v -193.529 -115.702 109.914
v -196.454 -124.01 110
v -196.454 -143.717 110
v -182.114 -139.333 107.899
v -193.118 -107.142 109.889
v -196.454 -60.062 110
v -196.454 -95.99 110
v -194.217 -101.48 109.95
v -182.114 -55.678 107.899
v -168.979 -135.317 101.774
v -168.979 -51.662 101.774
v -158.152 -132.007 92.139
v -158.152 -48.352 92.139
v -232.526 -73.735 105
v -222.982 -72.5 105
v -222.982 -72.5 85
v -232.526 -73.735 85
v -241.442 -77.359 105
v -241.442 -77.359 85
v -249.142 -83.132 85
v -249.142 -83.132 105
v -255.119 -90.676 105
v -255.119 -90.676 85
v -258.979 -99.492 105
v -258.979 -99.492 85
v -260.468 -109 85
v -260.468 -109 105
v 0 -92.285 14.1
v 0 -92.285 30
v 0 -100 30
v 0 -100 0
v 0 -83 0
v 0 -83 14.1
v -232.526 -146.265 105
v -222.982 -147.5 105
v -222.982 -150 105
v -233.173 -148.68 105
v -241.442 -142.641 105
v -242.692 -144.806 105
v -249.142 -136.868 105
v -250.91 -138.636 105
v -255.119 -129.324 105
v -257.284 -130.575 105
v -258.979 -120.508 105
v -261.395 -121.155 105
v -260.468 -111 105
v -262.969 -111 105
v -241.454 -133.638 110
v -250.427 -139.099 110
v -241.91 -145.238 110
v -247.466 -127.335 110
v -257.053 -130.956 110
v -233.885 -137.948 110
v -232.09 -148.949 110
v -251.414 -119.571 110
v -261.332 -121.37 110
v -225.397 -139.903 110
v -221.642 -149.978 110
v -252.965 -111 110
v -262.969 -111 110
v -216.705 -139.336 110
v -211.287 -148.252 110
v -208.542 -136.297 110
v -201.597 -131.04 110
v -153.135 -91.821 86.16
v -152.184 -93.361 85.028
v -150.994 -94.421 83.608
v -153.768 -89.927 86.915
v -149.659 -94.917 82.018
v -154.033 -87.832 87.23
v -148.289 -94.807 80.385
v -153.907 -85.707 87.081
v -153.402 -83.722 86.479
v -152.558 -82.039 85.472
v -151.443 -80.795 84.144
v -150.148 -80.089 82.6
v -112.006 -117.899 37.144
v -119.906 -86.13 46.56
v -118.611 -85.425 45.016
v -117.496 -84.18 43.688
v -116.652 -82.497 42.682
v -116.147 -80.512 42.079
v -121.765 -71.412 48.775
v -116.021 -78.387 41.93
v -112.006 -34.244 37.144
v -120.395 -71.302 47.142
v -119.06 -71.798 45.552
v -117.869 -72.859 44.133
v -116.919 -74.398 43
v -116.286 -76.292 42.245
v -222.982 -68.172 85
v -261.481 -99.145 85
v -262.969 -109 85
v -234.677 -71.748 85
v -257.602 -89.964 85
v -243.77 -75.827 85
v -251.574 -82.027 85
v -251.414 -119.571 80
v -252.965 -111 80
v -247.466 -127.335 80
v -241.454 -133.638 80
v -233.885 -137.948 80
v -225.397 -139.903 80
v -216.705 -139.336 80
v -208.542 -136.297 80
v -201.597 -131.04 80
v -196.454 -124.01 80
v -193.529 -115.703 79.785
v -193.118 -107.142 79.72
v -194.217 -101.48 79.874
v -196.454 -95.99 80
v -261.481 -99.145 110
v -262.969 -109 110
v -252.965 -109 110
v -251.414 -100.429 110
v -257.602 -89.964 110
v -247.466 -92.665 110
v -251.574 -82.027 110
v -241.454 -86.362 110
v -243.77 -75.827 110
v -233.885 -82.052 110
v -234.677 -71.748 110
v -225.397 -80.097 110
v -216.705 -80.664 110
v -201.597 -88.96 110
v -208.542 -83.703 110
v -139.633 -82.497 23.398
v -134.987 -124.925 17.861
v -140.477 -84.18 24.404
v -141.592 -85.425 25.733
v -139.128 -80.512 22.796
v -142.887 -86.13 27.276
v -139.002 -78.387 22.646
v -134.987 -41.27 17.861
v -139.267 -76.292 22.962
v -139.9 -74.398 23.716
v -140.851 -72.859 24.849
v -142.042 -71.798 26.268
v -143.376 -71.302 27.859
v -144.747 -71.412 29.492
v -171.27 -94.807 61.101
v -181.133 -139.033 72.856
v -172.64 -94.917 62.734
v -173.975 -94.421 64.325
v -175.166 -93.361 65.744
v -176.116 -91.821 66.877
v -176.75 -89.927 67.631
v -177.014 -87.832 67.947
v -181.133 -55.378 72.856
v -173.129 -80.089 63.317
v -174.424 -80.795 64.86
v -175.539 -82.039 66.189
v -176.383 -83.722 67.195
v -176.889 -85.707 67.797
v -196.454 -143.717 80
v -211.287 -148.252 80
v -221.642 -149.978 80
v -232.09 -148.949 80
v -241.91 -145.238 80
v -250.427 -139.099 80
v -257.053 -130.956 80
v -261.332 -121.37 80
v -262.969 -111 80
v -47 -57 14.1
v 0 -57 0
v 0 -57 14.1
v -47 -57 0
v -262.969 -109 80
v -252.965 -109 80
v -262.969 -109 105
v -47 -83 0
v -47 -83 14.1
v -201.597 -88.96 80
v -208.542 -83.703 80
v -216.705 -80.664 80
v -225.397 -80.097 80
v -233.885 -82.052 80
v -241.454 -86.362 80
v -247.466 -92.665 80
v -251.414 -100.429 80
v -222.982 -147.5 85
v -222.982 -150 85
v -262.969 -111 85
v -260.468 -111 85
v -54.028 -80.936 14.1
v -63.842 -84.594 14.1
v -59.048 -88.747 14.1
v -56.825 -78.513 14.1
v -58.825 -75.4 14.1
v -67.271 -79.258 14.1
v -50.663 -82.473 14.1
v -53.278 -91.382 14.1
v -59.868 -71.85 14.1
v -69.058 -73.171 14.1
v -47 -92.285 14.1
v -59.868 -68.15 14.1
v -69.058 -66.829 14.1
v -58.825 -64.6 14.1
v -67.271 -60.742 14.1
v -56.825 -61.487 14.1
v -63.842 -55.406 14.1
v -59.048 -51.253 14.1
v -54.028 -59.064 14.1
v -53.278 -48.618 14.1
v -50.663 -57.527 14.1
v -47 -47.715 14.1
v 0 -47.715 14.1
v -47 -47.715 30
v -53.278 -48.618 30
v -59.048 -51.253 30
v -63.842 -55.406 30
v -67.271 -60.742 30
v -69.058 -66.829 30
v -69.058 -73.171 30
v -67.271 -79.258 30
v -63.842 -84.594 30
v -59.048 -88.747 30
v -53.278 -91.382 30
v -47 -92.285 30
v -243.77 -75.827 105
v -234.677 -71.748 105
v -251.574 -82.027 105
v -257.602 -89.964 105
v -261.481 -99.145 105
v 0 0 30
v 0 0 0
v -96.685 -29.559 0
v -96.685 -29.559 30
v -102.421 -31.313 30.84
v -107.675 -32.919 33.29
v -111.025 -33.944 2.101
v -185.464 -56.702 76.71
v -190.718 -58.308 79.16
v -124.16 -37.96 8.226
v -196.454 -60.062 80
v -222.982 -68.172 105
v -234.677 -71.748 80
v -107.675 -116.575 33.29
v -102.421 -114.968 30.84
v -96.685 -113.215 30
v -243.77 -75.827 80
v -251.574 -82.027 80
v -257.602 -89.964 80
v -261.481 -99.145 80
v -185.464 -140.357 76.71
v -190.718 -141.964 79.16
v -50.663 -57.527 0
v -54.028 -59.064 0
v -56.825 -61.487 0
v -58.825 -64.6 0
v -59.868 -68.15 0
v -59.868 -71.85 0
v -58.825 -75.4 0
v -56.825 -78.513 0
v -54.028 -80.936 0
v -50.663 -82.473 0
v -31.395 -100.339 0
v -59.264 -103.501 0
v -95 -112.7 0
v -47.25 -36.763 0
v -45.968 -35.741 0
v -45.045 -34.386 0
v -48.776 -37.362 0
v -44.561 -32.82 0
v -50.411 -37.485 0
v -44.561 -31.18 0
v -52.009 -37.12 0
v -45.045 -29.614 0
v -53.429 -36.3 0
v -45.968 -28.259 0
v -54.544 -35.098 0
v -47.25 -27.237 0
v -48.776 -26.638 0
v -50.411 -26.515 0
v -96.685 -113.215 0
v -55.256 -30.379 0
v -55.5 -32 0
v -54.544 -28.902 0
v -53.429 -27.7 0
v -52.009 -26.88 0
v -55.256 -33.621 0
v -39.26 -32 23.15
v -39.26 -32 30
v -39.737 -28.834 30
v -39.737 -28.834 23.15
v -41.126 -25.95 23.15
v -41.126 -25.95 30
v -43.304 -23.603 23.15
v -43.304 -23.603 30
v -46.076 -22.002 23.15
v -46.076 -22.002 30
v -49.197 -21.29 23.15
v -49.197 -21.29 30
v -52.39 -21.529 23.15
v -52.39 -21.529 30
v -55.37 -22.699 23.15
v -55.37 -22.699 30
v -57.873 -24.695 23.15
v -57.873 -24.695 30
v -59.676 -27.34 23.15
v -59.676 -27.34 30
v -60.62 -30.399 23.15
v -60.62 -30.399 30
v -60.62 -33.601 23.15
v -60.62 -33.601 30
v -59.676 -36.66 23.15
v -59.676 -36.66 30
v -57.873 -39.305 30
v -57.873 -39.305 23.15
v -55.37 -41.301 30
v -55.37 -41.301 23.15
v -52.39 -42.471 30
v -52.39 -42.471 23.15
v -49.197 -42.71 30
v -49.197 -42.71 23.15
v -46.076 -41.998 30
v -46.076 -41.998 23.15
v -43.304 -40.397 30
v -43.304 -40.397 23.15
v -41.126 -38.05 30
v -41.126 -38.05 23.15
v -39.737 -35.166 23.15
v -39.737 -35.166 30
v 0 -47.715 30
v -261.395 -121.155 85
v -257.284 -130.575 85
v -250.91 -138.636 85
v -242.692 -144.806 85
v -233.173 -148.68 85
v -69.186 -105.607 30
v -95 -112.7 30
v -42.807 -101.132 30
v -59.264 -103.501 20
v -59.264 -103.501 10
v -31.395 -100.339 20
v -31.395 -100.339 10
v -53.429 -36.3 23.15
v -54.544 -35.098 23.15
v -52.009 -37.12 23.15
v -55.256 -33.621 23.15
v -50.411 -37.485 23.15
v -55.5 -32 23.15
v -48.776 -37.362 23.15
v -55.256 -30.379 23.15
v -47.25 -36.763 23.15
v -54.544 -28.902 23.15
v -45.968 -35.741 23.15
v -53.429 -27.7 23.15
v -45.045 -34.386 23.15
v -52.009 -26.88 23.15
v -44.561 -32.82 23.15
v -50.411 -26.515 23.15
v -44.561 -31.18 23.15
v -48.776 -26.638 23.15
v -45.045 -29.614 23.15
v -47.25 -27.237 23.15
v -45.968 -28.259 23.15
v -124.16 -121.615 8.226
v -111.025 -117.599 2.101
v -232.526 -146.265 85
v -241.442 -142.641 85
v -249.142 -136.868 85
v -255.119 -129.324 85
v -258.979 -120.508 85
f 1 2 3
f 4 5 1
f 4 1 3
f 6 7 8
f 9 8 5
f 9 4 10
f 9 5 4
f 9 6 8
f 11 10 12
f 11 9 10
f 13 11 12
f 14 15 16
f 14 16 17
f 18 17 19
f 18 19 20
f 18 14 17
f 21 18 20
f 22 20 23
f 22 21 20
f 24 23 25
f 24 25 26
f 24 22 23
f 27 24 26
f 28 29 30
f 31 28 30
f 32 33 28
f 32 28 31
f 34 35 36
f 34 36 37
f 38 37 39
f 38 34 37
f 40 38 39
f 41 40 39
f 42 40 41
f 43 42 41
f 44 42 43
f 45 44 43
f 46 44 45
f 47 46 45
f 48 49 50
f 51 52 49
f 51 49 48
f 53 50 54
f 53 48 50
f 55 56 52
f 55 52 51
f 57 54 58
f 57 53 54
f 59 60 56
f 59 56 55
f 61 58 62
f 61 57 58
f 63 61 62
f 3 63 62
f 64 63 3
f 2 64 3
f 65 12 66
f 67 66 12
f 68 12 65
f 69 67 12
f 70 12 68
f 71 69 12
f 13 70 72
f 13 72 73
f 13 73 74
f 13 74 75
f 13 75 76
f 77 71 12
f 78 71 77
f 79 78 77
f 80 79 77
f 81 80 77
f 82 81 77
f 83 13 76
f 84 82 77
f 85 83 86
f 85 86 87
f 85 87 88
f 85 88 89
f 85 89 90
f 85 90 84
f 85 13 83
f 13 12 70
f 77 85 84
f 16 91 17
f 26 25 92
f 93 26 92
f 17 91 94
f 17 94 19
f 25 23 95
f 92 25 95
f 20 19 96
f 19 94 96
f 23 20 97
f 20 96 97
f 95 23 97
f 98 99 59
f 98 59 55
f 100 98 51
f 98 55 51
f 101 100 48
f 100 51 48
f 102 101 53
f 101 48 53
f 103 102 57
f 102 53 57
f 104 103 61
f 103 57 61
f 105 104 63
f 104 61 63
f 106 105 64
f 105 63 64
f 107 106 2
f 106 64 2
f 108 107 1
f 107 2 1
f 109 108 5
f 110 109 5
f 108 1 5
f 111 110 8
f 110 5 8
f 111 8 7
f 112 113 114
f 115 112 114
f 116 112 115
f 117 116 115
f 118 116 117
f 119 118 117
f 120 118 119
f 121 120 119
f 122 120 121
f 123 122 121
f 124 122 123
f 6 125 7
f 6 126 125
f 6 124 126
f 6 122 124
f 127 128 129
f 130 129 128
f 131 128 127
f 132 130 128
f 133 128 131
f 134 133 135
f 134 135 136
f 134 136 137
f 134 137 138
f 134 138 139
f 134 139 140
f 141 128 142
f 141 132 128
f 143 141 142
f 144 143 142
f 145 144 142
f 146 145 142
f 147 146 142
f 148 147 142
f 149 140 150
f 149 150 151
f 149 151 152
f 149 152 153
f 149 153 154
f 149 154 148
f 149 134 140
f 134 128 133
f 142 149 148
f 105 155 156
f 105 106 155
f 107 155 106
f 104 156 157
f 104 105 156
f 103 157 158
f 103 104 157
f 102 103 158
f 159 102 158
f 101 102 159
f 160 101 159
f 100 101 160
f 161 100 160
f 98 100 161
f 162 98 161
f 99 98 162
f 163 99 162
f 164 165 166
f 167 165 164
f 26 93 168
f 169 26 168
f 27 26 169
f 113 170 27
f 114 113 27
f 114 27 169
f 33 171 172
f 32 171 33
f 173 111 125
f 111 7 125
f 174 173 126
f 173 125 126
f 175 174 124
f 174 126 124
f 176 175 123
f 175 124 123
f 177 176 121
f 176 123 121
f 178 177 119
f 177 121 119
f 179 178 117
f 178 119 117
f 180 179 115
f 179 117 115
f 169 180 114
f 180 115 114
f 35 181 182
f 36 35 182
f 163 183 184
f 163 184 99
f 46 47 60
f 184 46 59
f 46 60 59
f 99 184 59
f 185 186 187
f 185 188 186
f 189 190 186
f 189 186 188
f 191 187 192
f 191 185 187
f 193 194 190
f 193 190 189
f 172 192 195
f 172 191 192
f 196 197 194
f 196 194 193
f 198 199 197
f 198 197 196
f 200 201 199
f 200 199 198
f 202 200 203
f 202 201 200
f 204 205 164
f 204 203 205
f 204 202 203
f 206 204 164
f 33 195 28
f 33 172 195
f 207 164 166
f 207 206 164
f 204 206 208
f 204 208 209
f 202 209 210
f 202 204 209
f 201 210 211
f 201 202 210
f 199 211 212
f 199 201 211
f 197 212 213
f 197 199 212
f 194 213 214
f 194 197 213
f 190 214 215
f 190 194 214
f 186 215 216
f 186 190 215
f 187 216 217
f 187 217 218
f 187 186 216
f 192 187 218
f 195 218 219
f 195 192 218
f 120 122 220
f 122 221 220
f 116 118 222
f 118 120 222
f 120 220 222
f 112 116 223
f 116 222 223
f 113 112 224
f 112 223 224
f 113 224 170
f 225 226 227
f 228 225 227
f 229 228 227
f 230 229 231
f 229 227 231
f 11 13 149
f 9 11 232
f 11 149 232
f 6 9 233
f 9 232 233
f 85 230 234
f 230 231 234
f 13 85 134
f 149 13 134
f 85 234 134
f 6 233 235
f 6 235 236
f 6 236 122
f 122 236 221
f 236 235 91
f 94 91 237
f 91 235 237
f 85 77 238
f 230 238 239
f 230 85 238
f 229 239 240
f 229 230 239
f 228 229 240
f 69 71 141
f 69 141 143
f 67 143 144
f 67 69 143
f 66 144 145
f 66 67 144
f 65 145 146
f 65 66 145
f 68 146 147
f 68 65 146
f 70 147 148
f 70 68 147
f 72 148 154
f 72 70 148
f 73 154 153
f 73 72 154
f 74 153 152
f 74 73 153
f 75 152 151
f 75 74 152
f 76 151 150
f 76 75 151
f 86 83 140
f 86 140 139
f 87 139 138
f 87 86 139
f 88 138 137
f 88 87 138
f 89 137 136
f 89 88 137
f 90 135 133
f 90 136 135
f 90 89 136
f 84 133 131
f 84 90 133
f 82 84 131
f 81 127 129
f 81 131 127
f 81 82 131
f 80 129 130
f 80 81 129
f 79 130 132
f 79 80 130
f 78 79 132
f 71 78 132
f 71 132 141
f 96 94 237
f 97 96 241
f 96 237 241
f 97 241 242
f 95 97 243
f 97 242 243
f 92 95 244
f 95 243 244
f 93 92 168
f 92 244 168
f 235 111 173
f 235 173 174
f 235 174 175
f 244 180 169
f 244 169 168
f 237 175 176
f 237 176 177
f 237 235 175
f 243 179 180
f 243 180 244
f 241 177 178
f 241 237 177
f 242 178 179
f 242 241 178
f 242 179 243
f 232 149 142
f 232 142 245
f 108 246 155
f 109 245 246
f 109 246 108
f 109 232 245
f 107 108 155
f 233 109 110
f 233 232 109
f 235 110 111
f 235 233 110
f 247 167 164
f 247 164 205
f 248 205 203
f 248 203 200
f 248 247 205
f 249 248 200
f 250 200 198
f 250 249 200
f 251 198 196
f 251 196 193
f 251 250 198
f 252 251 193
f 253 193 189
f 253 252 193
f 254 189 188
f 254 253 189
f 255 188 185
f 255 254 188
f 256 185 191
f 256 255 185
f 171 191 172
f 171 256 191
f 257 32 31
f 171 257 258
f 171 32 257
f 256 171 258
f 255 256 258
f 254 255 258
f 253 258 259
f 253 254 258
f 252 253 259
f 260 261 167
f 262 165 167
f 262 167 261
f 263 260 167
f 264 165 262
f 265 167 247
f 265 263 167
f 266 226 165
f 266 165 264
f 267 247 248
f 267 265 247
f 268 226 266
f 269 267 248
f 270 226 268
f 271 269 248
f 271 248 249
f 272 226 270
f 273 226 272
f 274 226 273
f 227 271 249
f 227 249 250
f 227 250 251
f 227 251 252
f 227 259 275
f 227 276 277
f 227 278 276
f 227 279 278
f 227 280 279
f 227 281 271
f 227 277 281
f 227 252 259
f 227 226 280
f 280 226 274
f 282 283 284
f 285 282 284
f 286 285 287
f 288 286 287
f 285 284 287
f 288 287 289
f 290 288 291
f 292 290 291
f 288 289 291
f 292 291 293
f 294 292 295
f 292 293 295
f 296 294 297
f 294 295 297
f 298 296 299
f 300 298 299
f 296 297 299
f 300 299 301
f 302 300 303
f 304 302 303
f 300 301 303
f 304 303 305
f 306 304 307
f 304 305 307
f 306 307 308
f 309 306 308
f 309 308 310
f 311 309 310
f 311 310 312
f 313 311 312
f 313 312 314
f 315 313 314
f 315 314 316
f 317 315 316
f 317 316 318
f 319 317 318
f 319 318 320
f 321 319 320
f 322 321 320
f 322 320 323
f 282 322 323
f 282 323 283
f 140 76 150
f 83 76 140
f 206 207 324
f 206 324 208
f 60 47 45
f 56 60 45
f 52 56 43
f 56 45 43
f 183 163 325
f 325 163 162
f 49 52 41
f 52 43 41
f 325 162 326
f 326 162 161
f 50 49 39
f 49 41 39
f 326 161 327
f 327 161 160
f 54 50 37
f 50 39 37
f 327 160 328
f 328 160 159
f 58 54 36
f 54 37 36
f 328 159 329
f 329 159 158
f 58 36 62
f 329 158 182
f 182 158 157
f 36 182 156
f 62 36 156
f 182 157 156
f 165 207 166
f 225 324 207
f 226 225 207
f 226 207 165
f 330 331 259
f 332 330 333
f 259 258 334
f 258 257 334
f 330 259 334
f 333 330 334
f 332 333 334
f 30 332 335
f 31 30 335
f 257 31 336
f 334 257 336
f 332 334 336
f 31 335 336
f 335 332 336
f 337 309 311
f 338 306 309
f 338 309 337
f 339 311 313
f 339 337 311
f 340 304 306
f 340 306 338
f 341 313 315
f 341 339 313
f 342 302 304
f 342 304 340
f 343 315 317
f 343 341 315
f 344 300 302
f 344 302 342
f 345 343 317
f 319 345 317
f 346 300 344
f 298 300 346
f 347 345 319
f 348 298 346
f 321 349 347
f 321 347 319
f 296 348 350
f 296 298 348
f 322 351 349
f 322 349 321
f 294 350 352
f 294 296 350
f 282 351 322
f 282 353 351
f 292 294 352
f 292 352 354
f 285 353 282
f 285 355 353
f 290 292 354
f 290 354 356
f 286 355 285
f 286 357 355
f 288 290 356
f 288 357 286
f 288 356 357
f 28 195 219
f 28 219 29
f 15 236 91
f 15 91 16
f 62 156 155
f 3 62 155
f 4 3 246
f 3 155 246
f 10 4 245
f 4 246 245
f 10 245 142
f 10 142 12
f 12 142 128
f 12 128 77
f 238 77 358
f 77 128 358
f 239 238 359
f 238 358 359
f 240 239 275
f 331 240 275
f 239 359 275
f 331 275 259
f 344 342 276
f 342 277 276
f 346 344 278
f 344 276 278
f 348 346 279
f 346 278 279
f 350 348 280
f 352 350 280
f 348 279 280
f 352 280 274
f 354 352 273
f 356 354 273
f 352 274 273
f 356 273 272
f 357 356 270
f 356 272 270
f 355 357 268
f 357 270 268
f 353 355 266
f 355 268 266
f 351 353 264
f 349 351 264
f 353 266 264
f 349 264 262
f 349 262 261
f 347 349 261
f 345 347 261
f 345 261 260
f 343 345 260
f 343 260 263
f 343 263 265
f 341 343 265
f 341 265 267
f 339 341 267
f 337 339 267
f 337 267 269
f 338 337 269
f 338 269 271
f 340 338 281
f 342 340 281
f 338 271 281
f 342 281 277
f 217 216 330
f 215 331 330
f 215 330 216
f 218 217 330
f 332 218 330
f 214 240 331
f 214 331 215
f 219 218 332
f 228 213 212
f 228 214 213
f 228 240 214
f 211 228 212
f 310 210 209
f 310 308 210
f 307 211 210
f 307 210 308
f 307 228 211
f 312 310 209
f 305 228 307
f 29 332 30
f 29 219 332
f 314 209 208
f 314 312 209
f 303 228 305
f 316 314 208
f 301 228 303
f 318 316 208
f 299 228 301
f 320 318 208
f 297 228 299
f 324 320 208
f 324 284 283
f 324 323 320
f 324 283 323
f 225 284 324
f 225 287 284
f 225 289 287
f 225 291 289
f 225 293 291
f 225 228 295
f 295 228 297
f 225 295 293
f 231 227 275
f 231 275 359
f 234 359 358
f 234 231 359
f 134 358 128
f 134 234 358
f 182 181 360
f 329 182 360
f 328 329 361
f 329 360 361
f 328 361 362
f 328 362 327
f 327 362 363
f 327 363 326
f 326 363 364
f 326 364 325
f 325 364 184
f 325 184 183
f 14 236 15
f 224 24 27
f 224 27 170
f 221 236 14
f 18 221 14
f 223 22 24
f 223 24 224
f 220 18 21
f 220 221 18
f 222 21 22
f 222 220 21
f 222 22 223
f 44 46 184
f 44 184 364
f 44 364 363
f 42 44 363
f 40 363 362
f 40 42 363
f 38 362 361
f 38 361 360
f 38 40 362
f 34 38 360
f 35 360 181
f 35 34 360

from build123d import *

# Parameters (mm, degrees)
EXTRUDE_THIN1_DEPTH                       = 150
SKETCH2_OUTSIDE_W                         = 349.23
SKETCH2_OUTSIDE_H                         = 219.23
CUT_EXTRUDE1_DEPTH                        = 337.154726279
SKETCH3_R                                 = 30
CUT_EXTRUDE2_DEPTH                        = 323.116973634
CUT_EXTRUDE3_START                        = -15
CUT_EXTRUDE3_DEPTH                        = 10
SKETCH5_W                                 = 100
SKETCH5_H                                 = 2
CUT_EXTRUDE4_DEPTH                        = 323.116973634
CBORE_START                               = 14.1
CBORE_SLOT_FOR_M24_HEX_HEAD_BOLT1_DEPTH   = 15.9
CBORE_SLOT_FOR_M24_HEX_HEAD_BOLT1_2_DEPTH = 14.1
CBORE_FOR_M10_HEX_HEAD_BOLT1_D            = 11
CBORE_FOR_M10_HEX_HEAD_BOLT1_CBORE_D      = 21.48
CBORE_FOR_M10_HEX_HEAD_BOLT1_CBORE_DEPTH  = 6.85
CUT_EXTRUDE5_DEPTH                        = 303.31664336


# Read off the part's stored shape, not the designer's step: CBORE SLOT for M24 Hex Head Bolt1
with BuildPart() as part:
    # Sketch1 → Extrude-Thin1 (new body)
    with BuildSketch(Plane(origin=(0, 0, 0), x_dir=(1, 0, 0), z_dir=(0, 1, 0))):
        with BuildLine():
            Line((0, 0), (-96.684617092, 0))
            ThreePointArc((-96.684617092, 0), (-117.815530179, -4.684610648), (-134.986839248, -17.860619516))
            Line((-134.986839248, -17.860619516), (-181.133234795, -72.855752194))
            ThreePointArc((-181.133234795, -72.855752194), (-188.001758422, -78.126155741), (-196.454123657, -80))
            Line((-196.454123657, -80), (-280, -80))
            Line((-280, -80), (-280, -110))
            Line((-280, -110), (-196.454123657, -110))
            ThreePointArc((-196.454123657, -110), (-175.32321057, -105.315389352), (-158.151901501, -92.139380484))
            Line((-158.151901501, -92.139380484), (-112.005505955, -37.144247806))
            ThreePointArc((-112.005505955, -37.144247806), (-105.136982327, -31.873844259), (-96.684617092, -30))
            Line((-96.684617092, -30), (0, -30))
            Line((0, -30), (0, 0))
        make_face()
    extrude(amount=-EXTRUDE_THIN1_DEPTH)

    # Sketch2 outside → Cut-Extrude1 (cut, through all)
    with BuildSketch(Plane.XY):
        with Locations((-140, -75)):
            Rectangle(SKETCH2_OUTSIDE_W, SKETCH2_OUTSIDE_H)
        with BuildLine():
            Line((0, 0), (-234.676511429, -71.747809761))
            ThreePointArc((-234.676511429, -71.747809761), (-261.233833478, -121.694868189), (-211.286775051, -148.252190239))
            Line((-211.286775051, -148.252190239), (-95, -112.699755258))
            add(Edge.make_bspline(
                [(-95, -112.699755258), (-51.532544729, -99.410420536), (-36.95554526, -100), (0, -100)],
                knots=[0, 0, 0, 0, 1, 1, 1, 1], degree=3))
            Line((0, -100), (0, 0))
        make_face(mode=Mode.SUBTRACT)
    extrude(amount=CUT_EXTRUDE1_DEPTH, mode=Mode.SUBTRACT)

    # Sketch3 → Cut-Extrude2 (cut, through all)
    with BuildSketch(Plane.XY.offset(110)):
        with Locations(Location((-222.98164324, -110, 0), (0, 0, 27.840553026))):
            Circle(SKETCH3_R)
    extrude(amount=-CUT_EXTRUDE2_DEPTH, mode=Mode.SUBTRACT)

    # Sketch4 → Cut-Extrude3 (cut, symmetric)
    with BuildSketch(Plane.XY.offset(110).offset(CUT_EXTRUDE3_START)):
        with BuildLine():
            Line((-222.98164324, -68.172329741), (-222.98164324, -72.5))
            ThreePointArc((-222.98164324, -72.5), (-260.48164324, -110), (-222.98164324, -147.5))
            Line((-222.98164324, -147.5), (-222.98164324, -150))
            ThreePointArc((-222.98164324, -150), (-262.542277774, -115.912376445), (-234.676511429, -71.747809761))
            Line((-234.676511429, -71.747809761), (-222.98164324, -68.172329741))
        make_face()
    extrude(amount=CUT_EXTRUDE3_DEPTH, both=True, mode=Mode.SUBTRACT)

    # Sketch5 → Cut-Extrude4 (cut, through all)
    with BuildSketch(Plane.XY.offset(110)):
        with Locations((-272.98164324, -110)):
            Rectangle(SKETCH5_W, SKETCH5_H)
    extrude(amount=-CUT_EXTRUDE4_DEPTH, mode=Mode.SUBTRACT)

    # CBORE SLOT for M24 Hex Head Bolt1 outlin → CBORE SLOT for M24 Hex Head Bolt1 (cut)
    with BuildSketch(Plane.XY.offset(CBORE_START)):
        with BuildLine():
            Line((0, -47.715), (-47, -47.715))
            ThreePointArc((-47, -47.715), (-69.285, -70), (-47, -92.285))
            Line((-47, -92.285), (0, -92.285))
            Line((0, -92.285), (0, -47.715))
        make_face()
    extrude(amount=CBORE_SLOT_FOR_M24_HEX_HEAD_BOLT1_DEPTH, mode=Mode.SUBTRACT)

    # CBORE SLOT for M24 Hex Head Bolt1 2 outl → CBORE SLOT for M24 Hex Head Bolt1 2 (cut)
    with BuildSketch(Plane.XY):
        with BuildLine():
            Line((0, -83), (0, -57))
            Line((0, -57), (-47, -57))
            ThreePointArc((-47, -57), (-60, -70), (-47, -83))
            Line((-47, -83), (0, -83))
        make_face()
    extrude(amount=CBORE_SLOT_FOR_M24_HEX_HEAD_BOLT1_2_DEPTH, mode=Mode.SUBTRACT)

    # CBORE for M10 Hex Head Bolt1 (through all)
    with Locations(Plane.XY.offset(30)):
        with Locations((-50, -32)):
            CounterBoreHole(CBORE_FOR_M10_HEX_HEAD_BOLT1_D / 2, CBORE_FOR_M10_HEX_HEAD_BOLT1_CBORE_D / 2, CBORE_FOR_M10_HEX_HEAD_BOLT1_CBORE_DEPTH)

    # Sketch11 → Cut-Extrude5 (cut, through all)
    with BuildSketch(Plane(origin=(-47.437557366, 0, -39.80483689), x_dir=(0.6427876096865384, 0, -0.7660444431189788), z_dir=(0.7660444431189788, 0, 0.6427876096865384))):
        with BuildLine():
            Line((-159.78881321, -80.089014291), (-115.633379107, -71.411593064))
            ThreePointArc((-115.633379107, -71.411593064), (-106.827903218, -77.32459521), (-112.740905364, -86.130071099))
            Line((-112.740905364, -86.130071099), (-156.896339468, -94.807492326))
            ThreePointArc((-156.896339468, -94.807492326), (-165.701815356, -88.89449018), (-159.78881321, -80.089014291))
        make_face()
    extrude(amount=-CUT_EXTRUDE5_DEPTH, mode=Mode.SUBTRACT)


solid = part.part
